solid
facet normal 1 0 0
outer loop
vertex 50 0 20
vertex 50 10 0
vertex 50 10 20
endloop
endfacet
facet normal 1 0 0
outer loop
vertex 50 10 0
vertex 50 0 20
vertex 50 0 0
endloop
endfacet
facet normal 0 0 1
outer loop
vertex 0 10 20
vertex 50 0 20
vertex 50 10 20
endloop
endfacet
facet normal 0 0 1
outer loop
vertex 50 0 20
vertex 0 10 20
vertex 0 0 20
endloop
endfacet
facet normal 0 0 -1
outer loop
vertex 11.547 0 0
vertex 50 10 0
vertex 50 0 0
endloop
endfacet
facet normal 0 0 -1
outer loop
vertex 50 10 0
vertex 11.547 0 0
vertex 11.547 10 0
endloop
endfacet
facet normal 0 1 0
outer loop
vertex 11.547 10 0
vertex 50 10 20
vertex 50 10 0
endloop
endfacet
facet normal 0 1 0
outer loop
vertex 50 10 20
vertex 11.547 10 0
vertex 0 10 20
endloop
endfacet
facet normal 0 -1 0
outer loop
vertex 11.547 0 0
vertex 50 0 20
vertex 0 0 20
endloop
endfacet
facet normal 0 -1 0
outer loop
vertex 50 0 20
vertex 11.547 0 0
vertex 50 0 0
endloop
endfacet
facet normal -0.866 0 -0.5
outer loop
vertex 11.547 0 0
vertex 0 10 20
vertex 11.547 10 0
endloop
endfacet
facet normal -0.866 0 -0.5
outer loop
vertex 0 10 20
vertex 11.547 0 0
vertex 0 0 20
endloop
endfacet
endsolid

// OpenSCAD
thick = 4;
width = 50;
depth = 10;
height = 20;
angle = 30;

//rotate([0,angle,0])
difference(){    
cube([width, depth, height]);
translate([0,depth,0])
    rotate([90,0,0])
        linear_extrude(height = depth, center = false, convexity = 10, twist = 0)
            polygon(points=[[0,0],[0,height],[tan(angle)*height,0]], paths=[[0,1,2]]);
}
